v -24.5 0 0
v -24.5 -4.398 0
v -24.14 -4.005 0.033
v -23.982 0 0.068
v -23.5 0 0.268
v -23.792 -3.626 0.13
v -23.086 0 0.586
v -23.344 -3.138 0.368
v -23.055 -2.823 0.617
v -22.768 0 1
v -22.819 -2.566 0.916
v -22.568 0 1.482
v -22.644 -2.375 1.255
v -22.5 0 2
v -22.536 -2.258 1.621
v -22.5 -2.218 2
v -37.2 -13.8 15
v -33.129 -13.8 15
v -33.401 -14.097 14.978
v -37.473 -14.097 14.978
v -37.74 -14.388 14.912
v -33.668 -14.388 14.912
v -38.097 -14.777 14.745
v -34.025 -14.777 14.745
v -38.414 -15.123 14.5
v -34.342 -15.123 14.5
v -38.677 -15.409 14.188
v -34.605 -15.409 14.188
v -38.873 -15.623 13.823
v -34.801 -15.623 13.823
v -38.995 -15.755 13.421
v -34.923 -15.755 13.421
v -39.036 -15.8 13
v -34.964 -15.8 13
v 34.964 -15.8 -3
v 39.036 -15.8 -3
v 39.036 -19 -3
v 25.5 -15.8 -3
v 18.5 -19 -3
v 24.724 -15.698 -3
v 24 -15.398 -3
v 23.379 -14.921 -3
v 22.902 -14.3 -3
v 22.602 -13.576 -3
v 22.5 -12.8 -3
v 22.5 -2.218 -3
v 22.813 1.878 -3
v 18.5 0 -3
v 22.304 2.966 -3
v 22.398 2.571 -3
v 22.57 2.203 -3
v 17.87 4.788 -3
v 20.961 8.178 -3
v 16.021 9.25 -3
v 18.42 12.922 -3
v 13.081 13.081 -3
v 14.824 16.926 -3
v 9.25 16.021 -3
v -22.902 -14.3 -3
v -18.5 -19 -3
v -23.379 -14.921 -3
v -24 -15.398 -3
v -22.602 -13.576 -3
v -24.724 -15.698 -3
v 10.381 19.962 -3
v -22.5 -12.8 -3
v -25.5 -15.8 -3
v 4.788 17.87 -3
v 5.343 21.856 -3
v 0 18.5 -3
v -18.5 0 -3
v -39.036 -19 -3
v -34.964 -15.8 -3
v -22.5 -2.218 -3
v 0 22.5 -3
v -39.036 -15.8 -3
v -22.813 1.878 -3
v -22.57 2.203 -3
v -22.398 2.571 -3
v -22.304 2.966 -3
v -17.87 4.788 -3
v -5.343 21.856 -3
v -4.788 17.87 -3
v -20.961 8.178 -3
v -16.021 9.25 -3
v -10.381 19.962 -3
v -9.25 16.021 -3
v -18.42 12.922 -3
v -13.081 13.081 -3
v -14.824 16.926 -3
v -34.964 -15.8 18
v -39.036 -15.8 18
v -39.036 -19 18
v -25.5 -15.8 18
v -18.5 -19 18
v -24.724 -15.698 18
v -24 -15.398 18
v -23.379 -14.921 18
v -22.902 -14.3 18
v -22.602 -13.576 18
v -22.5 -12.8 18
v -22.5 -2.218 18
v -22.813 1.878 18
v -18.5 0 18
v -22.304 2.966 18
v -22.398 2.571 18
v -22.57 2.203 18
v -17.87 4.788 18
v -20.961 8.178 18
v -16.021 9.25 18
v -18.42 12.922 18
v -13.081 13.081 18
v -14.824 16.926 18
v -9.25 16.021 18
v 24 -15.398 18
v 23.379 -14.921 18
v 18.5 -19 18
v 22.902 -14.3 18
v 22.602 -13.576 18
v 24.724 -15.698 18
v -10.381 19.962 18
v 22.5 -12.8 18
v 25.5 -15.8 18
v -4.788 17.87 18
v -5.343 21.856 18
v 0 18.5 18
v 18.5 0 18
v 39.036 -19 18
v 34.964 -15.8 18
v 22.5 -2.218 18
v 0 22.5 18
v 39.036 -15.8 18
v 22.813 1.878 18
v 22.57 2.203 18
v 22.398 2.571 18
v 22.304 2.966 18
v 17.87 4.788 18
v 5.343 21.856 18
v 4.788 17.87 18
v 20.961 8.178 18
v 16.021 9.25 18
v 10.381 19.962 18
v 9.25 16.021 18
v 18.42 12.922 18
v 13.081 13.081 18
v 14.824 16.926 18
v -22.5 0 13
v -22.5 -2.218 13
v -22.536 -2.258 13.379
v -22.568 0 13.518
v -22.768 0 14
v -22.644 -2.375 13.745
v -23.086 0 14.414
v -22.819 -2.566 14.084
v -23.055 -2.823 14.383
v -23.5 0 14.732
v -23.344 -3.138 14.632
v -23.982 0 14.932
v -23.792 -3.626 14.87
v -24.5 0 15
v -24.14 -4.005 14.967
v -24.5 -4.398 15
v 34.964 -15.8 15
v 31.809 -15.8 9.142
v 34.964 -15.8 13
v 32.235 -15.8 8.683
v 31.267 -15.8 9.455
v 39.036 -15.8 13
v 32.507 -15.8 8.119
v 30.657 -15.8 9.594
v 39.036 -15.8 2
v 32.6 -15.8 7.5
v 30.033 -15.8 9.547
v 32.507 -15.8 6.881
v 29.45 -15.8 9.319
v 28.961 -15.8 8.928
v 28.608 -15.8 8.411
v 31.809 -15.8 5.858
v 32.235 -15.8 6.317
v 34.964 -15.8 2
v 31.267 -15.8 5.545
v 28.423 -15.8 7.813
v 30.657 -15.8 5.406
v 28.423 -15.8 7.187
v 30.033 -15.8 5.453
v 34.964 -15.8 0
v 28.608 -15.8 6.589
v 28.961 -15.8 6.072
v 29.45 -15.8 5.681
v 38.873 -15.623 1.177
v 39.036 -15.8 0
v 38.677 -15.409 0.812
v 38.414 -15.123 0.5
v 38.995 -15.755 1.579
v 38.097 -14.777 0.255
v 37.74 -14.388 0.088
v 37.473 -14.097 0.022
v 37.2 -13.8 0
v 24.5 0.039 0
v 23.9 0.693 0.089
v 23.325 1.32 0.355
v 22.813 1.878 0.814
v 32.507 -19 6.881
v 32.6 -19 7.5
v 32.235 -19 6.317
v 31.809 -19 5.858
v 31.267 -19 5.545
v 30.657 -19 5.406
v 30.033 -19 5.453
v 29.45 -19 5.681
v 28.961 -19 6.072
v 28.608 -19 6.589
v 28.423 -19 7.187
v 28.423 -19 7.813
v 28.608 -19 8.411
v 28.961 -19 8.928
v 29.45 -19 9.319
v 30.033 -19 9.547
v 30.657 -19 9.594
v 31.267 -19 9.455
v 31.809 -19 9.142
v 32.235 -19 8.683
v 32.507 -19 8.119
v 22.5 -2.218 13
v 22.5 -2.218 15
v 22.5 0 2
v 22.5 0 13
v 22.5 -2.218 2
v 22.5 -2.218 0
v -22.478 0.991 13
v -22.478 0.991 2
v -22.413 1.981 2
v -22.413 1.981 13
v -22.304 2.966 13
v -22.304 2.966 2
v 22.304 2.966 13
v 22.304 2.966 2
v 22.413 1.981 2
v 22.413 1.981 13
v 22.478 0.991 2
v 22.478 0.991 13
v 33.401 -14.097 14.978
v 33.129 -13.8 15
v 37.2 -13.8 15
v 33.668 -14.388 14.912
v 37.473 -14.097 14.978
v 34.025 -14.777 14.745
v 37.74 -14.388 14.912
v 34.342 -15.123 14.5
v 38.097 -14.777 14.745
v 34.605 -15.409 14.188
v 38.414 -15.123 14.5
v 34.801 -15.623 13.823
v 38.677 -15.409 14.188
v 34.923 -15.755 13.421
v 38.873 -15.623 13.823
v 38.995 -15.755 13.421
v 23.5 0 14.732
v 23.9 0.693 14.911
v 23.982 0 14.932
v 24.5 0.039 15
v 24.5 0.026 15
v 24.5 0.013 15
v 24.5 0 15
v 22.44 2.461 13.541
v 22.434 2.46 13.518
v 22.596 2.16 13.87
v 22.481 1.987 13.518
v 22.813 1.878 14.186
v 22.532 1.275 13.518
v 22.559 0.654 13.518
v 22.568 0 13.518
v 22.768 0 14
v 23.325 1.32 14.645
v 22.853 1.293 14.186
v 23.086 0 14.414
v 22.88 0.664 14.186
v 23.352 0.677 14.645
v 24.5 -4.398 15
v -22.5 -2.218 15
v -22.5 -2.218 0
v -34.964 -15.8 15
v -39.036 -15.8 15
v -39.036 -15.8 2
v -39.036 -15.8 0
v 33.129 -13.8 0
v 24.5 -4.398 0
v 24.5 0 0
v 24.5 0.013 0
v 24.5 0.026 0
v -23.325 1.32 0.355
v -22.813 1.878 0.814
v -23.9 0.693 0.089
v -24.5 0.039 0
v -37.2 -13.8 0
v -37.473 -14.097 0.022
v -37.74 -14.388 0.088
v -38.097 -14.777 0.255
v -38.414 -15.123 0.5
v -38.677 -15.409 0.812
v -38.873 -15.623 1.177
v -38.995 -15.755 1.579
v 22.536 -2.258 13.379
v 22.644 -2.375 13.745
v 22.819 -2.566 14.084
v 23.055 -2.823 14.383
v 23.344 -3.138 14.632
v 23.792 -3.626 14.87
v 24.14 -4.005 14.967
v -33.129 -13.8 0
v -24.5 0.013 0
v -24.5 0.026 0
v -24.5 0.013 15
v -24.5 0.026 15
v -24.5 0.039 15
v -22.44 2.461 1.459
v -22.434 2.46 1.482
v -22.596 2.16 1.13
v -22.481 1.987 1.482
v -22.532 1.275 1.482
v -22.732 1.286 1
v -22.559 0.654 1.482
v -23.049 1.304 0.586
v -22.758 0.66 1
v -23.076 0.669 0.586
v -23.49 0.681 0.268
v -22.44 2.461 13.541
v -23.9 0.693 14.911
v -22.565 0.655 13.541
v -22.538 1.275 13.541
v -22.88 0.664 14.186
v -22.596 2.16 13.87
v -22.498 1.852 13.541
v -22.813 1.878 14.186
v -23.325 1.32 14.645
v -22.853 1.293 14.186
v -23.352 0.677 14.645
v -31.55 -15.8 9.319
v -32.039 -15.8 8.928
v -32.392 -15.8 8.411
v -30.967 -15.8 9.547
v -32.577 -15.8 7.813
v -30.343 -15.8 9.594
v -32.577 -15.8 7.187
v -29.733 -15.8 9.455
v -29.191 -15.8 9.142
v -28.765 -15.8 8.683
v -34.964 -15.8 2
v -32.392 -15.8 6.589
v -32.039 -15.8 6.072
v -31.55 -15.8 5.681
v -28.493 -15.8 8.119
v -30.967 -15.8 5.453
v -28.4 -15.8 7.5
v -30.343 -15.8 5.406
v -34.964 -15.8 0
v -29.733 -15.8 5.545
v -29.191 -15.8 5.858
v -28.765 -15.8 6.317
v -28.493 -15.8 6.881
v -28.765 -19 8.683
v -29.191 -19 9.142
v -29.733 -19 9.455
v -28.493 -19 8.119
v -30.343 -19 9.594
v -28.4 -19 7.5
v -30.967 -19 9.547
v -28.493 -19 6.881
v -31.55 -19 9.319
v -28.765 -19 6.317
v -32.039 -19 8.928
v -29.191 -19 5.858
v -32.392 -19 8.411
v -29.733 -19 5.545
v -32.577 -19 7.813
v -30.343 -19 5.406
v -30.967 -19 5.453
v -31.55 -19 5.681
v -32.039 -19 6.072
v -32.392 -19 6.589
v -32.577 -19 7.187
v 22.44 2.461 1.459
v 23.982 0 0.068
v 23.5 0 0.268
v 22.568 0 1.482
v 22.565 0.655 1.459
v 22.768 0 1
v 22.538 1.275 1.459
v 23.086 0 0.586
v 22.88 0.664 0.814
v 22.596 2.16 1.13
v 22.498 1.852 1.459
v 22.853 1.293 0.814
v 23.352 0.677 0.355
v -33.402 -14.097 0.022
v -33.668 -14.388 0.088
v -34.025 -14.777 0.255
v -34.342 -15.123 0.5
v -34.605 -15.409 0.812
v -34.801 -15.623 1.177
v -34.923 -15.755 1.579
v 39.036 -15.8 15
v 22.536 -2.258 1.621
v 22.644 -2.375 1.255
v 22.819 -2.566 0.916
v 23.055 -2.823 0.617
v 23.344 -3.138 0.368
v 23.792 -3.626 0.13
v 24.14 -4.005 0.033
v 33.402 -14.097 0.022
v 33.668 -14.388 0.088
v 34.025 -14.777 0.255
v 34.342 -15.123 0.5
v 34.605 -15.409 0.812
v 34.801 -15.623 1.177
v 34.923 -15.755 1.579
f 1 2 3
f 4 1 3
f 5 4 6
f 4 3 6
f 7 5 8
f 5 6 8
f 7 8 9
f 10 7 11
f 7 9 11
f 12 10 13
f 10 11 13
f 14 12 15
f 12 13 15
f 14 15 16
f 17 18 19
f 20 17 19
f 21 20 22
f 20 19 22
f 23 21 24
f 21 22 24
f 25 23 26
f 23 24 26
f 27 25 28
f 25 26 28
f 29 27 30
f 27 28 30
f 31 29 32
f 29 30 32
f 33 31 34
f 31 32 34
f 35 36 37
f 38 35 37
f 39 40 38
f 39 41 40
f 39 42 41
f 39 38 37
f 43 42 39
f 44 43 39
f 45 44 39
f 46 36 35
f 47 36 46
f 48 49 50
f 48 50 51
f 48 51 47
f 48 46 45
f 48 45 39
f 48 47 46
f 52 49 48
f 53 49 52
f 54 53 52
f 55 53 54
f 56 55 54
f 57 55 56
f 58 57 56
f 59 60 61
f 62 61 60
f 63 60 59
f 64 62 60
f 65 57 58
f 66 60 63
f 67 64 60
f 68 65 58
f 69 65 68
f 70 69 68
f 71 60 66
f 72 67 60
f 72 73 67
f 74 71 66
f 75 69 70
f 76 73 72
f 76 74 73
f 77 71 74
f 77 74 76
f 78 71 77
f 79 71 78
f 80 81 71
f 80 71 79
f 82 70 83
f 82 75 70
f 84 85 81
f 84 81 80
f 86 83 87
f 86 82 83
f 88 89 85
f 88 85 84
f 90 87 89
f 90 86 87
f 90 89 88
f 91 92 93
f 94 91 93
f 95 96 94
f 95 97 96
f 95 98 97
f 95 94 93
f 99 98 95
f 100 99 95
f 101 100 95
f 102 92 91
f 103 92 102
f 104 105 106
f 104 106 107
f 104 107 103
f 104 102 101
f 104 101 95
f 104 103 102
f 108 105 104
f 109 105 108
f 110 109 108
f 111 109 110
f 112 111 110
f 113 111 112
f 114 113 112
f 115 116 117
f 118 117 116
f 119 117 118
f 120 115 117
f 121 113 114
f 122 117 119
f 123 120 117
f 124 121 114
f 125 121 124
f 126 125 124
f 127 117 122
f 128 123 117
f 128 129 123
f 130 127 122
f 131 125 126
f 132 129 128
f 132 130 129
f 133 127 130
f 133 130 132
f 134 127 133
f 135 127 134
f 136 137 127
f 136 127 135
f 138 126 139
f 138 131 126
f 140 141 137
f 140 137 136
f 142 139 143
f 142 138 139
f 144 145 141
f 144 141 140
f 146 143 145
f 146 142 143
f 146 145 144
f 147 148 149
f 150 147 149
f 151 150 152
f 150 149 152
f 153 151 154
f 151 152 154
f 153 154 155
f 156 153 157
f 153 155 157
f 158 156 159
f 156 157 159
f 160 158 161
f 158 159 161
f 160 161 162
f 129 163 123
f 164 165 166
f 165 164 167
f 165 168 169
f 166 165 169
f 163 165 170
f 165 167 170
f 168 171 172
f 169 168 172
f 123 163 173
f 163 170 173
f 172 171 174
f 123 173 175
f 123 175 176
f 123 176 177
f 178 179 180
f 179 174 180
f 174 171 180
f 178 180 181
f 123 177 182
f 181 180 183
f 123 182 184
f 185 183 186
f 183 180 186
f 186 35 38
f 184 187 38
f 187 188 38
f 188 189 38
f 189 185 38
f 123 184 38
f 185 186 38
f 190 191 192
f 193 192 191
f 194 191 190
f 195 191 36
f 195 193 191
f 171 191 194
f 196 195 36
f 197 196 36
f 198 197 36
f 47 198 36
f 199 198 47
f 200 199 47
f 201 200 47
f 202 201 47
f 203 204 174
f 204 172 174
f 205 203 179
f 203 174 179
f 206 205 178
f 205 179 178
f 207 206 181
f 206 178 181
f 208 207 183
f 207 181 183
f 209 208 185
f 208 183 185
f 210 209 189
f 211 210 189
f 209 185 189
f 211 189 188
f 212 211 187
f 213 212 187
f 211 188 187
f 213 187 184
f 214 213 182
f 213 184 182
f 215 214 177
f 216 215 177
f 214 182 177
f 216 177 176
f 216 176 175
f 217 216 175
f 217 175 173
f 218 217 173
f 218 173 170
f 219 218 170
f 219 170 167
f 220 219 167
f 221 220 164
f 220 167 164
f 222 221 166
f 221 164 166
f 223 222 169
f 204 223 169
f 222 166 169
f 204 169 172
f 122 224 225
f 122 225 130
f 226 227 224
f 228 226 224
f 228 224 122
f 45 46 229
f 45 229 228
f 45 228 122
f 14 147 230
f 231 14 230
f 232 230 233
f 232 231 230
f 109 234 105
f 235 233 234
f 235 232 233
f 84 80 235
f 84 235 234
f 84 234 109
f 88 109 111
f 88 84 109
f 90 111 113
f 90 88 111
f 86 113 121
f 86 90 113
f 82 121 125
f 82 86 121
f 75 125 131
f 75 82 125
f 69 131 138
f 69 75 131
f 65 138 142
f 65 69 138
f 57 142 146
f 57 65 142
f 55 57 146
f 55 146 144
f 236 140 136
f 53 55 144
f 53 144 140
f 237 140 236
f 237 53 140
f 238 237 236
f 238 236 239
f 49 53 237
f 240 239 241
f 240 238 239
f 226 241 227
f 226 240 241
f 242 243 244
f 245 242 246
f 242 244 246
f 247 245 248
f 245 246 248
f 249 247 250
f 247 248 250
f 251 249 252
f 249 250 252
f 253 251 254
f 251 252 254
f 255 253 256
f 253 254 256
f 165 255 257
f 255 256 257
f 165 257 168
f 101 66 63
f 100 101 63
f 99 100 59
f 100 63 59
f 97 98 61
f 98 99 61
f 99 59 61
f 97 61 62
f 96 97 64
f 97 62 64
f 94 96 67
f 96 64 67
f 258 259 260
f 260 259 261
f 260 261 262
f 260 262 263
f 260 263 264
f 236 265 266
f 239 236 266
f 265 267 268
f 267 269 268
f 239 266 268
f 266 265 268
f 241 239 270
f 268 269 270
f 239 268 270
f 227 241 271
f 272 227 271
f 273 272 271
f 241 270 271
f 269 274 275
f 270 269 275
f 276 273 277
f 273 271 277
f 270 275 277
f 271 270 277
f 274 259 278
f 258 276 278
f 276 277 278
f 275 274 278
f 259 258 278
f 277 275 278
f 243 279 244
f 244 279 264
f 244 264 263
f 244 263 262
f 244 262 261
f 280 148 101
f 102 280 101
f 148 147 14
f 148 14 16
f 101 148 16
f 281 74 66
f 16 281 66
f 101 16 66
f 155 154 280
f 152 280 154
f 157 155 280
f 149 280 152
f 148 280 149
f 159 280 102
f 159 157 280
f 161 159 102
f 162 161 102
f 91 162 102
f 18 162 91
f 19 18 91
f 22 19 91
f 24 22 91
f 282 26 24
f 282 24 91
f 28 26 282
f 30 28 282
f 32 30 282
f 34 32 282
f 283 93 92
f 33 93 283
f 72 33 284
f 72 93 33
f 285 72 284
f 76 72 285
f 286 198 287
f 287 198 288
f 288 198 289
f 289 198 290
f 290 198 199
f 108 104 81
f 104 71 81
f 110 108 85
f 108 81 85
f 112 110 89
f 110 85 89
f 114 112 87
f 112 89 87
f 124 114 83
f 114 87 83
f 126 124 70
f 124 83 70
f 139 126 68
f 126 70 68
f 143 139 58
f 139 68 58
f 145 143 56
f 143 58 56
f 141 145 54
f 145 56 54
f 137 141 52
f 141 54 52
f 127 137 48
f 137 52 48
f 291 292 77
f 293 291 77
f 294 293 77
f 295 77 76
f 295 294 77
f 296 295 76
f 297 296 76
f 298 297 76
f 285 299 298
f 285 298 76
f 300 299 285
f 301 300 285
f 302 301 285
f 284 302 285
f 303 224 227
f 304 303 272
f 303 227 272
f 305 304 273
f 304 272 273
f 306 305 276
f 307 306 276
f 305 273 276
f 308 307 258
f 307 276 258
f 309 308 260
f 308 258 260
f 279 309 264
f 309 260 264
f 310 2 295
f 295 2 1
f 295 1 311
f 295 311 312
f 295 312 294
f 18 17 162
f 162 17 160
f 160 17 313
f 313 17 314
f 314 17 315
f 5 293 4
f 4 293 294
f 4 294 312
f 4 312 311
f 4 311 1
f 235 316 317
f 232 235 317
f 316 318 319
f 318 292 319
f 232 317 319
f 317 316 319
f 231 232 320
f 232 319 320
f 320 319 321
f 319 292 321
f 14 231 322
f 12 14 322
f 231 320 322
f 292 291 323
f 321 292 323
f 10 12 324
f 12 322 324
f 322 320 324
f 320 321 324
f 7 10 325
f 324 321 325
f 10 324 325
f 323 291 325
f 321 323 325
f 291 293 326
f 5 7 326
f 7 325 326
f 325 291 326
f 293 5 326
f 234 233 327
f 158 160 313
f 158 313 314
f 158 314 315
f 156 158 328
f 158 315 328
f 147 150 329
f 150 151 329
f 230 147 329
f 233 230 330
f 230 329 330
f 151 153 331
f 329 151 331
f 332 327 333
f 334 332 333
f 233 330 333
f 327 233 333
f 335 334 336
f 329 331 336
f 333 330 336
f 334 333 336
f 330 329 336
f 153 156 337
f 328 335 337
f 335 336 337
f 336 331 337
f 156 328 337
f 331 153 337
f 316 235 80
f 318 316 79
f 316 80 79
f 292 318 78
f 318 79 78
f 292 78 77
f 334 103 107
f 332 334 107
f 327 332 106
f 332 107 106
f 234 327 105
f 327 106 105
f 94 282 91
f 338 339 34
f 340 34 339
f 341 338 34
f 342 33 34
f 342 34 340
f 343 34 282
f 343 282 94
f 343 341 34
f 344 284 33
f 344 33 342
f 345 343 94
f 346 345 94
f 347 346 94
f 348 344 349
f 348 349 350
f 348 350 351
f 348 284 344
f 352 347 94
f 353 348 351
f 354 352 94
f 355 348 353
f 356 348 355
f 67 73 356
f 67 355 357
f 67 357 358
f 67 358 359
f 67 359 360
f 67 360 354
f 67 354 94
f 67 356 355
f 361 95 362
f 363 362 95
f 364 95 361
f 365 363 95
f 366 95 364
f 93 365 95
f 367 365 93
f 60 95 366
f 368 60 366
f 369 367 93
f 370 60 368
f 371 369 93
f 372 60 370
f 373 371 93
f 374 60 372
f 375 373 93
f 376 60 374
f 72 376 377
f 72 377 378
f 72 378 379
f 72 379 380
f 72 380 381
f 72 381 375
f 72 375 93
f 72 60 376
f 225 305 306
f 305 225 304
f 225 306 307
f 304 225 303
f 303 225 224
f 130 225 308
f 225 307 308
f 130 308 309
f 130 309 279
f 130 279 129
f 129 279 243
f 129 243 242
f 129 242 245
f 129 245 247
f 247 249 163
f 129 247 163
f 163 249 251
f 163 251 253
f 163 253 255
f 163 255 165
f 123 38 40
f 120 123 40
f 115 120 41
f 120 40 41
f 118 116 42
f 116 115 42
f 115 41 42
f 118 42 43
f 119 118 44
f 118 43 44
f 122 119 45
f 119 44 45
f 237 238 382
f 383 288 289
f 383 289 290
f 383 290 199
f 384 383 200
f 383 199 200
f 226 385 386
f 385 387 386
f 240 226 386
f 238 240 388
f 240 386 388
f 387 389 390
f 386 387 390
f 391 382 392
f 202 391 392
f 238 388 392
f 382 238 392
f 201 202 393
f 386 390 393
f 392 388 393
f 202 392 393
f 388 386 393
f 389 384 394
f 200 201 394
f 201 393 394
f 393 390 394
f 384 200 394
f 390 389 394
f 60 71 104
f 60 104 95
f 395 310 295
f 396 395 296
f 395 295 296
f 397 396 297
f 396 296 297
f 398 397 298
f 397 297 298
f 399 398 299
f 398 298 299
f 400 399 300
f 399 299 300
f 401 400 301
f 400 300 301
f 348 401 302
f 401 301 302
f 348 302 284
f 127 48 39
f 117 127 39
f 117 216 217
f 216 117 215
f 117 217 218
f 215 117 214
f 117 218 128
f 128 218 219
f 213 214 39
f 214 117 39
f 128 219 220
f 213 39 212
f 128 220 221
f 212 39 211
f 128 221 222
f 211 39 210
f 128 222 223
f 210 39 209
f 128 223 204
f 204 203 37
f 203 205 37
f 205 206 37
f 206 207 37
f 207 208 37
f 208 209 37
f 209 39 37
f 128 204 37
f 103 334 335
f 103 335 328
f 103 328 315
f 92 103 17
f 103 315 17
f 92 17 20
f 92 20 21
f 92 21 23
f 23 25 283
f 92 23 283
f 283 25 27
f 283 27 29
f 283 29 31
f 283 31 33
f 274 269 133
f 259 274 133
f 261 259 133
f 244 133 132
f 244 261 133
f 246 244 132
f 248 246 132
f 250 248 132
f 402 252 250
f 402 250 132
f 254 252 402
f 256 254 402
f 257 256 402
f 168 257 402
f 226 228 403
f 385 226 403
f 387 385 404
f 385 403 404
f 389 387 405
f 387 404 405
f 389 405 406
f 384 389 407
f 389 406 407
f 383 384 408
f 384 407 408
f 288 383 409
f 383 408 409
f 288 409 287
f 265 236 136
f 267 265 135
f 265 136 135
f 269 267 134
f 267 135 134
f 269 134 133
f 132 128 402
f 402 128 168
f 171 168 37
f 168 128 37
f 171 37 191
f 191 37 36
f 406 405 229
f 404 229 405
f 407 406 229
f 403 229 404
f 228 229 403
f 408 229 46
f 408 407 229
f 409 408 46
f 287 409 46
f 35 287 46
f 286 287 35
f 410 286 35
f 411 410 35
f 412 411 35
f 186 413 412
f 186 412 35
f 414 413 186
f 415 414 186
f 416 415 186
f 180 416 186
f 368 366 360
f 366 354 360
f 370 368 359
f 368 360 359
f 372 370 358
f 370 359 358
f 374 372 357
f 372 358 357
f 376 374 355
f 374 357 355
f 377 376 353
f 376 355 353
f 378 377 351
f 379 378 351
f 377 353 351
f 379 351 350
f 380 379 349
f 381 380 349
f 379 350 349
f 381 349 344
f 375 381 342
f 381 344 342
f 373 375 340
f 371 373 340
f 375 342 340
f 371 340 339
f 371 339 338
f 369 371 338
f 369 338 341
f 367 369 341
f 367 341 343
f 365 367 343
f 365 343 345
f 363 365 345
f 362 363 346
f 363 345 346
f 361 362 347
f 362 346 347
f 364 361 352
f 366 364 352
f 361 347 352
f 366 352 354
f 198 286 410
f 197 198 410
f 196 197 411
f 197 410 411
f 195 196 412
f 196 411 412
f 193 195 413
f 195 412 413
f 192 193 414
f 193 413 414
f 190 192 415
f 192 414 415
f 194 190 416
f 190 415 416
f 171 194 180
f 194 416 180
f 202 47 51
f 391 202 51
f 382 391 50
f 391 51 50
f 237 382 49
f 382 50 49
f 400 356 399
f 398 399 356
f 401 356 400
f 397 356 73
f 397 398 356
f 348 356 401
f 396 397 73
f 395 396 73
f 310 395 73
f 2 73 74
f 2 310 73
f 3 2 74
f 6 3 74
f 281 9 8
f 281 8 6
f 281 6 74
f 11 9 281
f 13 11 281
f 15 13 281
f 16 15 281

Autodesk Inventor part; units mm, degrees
ref_plane "YZ Plane" through (0, 0, 0) normal (1, 0, 0) x (0, 1, 0)
ref_plane "XZ Plane" through (0, 0, 0) normal (0, 1, 0) x (-1, 0, 0)
ref_plane "XY Plane" through (0, 0, 0) normal (0, 0, 1) x (1, 0, 0)
sketch "Эскиз1" plane through (0, 0, 0) normal (0, 0, 1) x (1, 0, 0)
  arc A0 (18.5, 0) -> (-18.5, 0) centre (0, 0) ccw
  line L0 (-22.5, 0) -> (22.5, 0)
  arc A1 (22.5, 0) -> (-22.5, 0) centre (0, 0) ccw
  line L1 (-22.5, 0) -> (-22.5, -12.8)
  line L2 (-22.5, -19) -> (-35.5, -19)
  line L3 (-35.5, -19) -> (-35.5, -15.8)
  line L4 (-35.5, -15.8) -> (-25.5, -15.8)
  arc A2 (-25.5, -15.8) -> (-22.5, -12.8) centre (-25.5, -12.8) ccw
  line L5 (-18.5, 0) -> (-18.5, -19)
  line L6 (-18.5, -19) -> (-22.5, -19)
  line L7 (0, 0) -> (0, 6.7823)
  line L8 (22.5, 0) -> (22.5, -12.8)
  line L9 (22.5, -19) -> (35.5, -19)
  line L10 (35.5, -19) -> (35.5, -15.8)
  line L11 (35.5, -15.8) -> (25.5, -15.8)
  arc A3 (22.5, -12.8) -> (25.5, -15.8) centre (25.5, -12.8) ccw
  line L12 (18.5, 0) -> (18.5, -19)
  line L13 (18.5, -19) -> (22.5, -19)
  dimension "d0" = 37
  dimension "d1" = 45
  dimension "d2" = 13
  dimension "d3" = 3.2
  dimension "d4" = 3
extrude "Выдавливание1" add sketch "Эскиз1" along normal blind 15 contours A0 L0 A1 | L0 L8 A3 L11 L10 L9 L13 L12 | L5 L6 L2 L3 L4 A2 L1 L0
sketch "Эскиз2" plane through (-35.5, -15.8, 0) normal (0, 1, 0) x (1, 0, 0)
  line L0 (71, 0) -> (61, 0) projected
  line L1 (61, 0) -> (61, -15) projected
  line L2 (71, -15) -> (61, -15) projected
  line L3 (71, 0) -> (71, -15) projected
  line L4 (71, -7.5) -> (0, -7.5)
  line L5 (0, 0) -> (0, -15) projected
  line L6 (10, 0) -> (0, 0) projected
  line L7 (10, 0) -> (10, -15) projected
  line L8 (10, -15) -> (0, -15) projected
  line L9 (5, -15) -> (5, 0)
  circle A0 centre (5, -7.5) radius 2.1
  line L10 (35.5, 0) -> (35.5, -25.4)
  circle A1 centre (66, -7.5) radius 2.1
  dimension "d7" = 4.2
extrude "Выдавливание2" cut sketch "Эскиз2" against normal blind 20 contours A1 L4 | L4 A1 | A0 L9 L4 | L4 L9 A0 | L9 A0 L4 | L4 A0 L9
sketch "Эскиз3" plane through (0, 0, 15) normal (0, 0, 1) x (1, 0, 0)
  line L0 (35.5, -15.8) -> (39.0359, -15.8)
  line L1 (22.5, 0) -> (37, -15.8)
  line L2 (21.3948, -1.0142) -> (35.8948, -16.8142)
  line L3 (22.3766, 2.3529) -> (39.0359, -15.8)
  line L4 (-18.5, -19) -> (-18.5, 0) projected
  arc A0 (18.5, 0) -> (-18.5, 0) centre (0, 0) ccw projected
  line L5 (18.5, 0) -> (18.5, -19) projected
  line L6 (18.5, -19) -> (35.5, -19) projected
  line L7 (35.5, -19) -> (35.5, -15.8) projected
  line L8 (35.5, -15.8) -> (25.5, -15.8) projected
  arc A1 (22.5, -12.8) -> (25.5, -15.8) centre (25.5, -12.8) ccw projected
  line L9 (22.5, -12.8) -> (22.5, 0) projected
  arc A2 (22.5, 0) -> (-22.5, 0) centre (0, 0) ccw projected
  line L10 (-22.5, 0) -> (-22.5, -12.8) projected
  arc A3 (-25.5, -15.8) -> (-22.5, -12.8) centre (-25.5, -12.8) ccw projected
  line L11 (-25.5, -15.8) -> (-35.5, -15.8) projected
  line L12 (-35.5, -15.8) -> (-35.5, -19) projected
  line L13 (-35.5, -19) -> (-18.5, -19) projected
  line L14 (39.0359, -15.8) -> (35.5, -15.8)
  line L15 (35.5, -15.8) -> (35.5, -19)
  line L16 (35.5, -19) -> (39.0359, -19)
  line L17 (39.0359, -19) -> (39.0359, -15.8)
  line L18 (0, 0) -> (0, 30.1625)
  line L19 (-35.5, -15.8) -> (-39.0359, -15.8)
  line L20 (-22.5, 0) -> (-37, -15.8)
  line L21 (-21.3948, -1.0142) -> (-35.8948, -16.8142)
  line L22 (-22.3766, 2.3529) -> (-39.0359, -15.8)
  line L23 (-18.5, 0) -> (-18.5, -19)
  line L24 (-18.5, -19) -> (-35.5, -19)
  line L25 (-35.5, -19) -> (-35.5, -15.8)
  line L26 (-35.5, -15.8) -> (-25.5, -15.8)
  arc A4 (-25.5, -15.8) -> (-22.5, -12.8) centre (-25.5, -12.8) ccw
  line L27 (-22.5, -12.8) -> (-22.5, 0)
  line L28 (-39.0359, -15.8) -> (-35.5, -15.8)
  line L29 (-35.5, -15.8) -> (-35.5, -19)
  line L30 (-35.5, -19) -> (-39.0359, -19)
  line L31 (-39.0359, -19) -> (-39.0359, -15.8)
  point P0 (22.5, -2.2185)
  point P1 (34.9641, -15.8)
  point P2 (35.5, -16.384)
  point P3 (-34.9641, -15.8)
  point P4 (-22.5, -2.2185)
  dimension "d11" = 1.5
  dimension "d12" = 1.5
extrude "Выдавливание3" add sketch "Эскиз3" along normal blind 3 contours L8 L2 L9 L1 L0 | L0 L17 L16 L7 | L7 L2 L8 | L1 A2 L3 L0 | L7 L6 L5 A0 L18 A2 L9 A1 L8 L2 | L18 A0 L4 L13 L12 L21 L11 A3 L10 A2 | A2 L20 L19 L22 | L10 L21 L11 L19 L20 | L19 L12 L30 L31 | L21 L12 L11
sketch "Эскиз4" plane through (0, 0, 0) normal (0, 0, -1) x (-1, 0, 0)
  line L0 (18.5, -19) -> (18.5, 0) projected
  line L1 (35.5, -19) -> (18.5, -19) projected
  line L2 (35.5, -15.8) -> (35.5, -19) projected
  line L3 (25.5, -15.8) -> (35.5, -15.8) projected
  arc A0 (22.5, -12.8) -> (25.5, -15.8) centre (25.5, -12.8) ccw projected
  line L4 (22.5, 0) -> (22.5, -12.8) projected
  arc A1 (22.5, 0) -> (-22.5, 0) centre (0, 0) ccw projected
  line L5 (-22.5, -12.8) -> (-22.5, 0) projected
  arc A2 (-25.5, -15.8) -> (-22.5, -12.8) centre (-25.5, -12.8) ccw projected
  line L6 (-35.5, -15.8) -> (-25.5, -15.8) projected
  line L7 (-35.5, -19) -> (-35.5, -15.8) projected
  line L8 (-18.5, -19) -> (-35.5, -19) projected
  line L9 (-18.5, 0) -> (-18.5, -19) projected
  arc A3 (18.5, 0) -> (-18.5, 0) centre (0, 0) ccw projected
  line L10 (-35.5, -19) -> (-35.5, -15.8) projected
  line L11 (-35.5, -15.8) -> (-34.9641, -15.8) projected
  line L12 (-22.5, -2.2185) -> (-34.9641, -15.8) projected
  line L13 (-22.5, -2.2185) -> (-22.5, 0) projected
  arc A4 (-22.3766, 2.3529) -> (-22.5, 0) centre (0, 0) ccw projected
  line L14 (-39.0359, -15.8) -> (-22.3766, 2.3529) projected
  line L15 (-39.0359, -19) -> (-39.0359, -15.8) projected
  line L16 (-35.5, -19) -> (-39.0359, -19) projected
  line L17 (35.5, -15.8) -> (35.5, -19) projected
  line L18 (39.0359, -19) -> (35.5, -19) projected
  line L19 (39.0359, -15.8) -> (39.0359, -19) projected
  line L20 (22.3766, 2.3529) -> (39.0359, -15.8) projected
  arc A5 (22.5, 0) -> (22.3766, 2.3529) centre (0, 0) ccw projected
  line L21 (22.5, 0) -> (22.5, -2.2185) projected
  line L22 (34.9641, -15.8) -> (22.5, -2.2185) projected
  line L23 (34.9641, -15.8) -> (35.5, -15.8) projected
  point P0 (-22.3766, 2.3529)
extrude "Выдавливание4" add sketch "Эскиз4" along normal blind 3 contours L0 A3 L9 L8 L7 L6 A2 L5 A1 L4 A0 L3 L2 L1 | L2 L3 L22 L4 A1 L20 L19 L18 | L16 L15 L14 A1 L5 L12 L6 L7
sketch "Эскиз5" plane through (0, 0, 15) normal (0, 0, -1) x (-1, 0, 0)
  line L0 (-35.5, -19) -> (-35.5, -15.8) projected
  line L1 (-35.5, -15.8) -> (-34.9641, -15.8) projected
  line L2 (-22.5, -2.2185) -> (-34.9641, -15.8) projected
  line L3 (-22.5, -2.2185) -> (-22.5, 0) projected
  arc A0 (-22.3766, 2.3529) -> (-22.5, 0) centre (0, 0) ccw projected
  line L4 (-39.0359, -15.8) -> (-22.3766, 2.3529) projected
  line L5 (-39.0359, -19) -> (-39.0359, -15.8) projected
  line L6 (-35.5, -19) -> (-39.0359, -19) projected
  line L7 (35.5, -15.8) -> (35.5, -19) projected
  line L8 (39.0359, -19) -> (35.5, -19) projected
  line L9 (39.0359, -15.8) -> (39.0359, -19) projected
  line L10 (22.3766, 2.3529) -> (39.0359, -15.8) projected
  arc A1 (22.5, 0) -> (22.3766, 2.3529) centre (0, 0) ccw projected
  line L11 (22.5, 0) -> (22.5, -2.2185) projected
  line L12 (34.9641, -15.8) -> (22.5, -2.2185) projected
  line L13 (34.9641, -15.8) -> (35.5, -15.8) projected
  line L14 (39.0359, -15.8) -> (-39.0359, -15.8)
  line L15 (-18.5, -19) -> (-39.0359, -19) projected
extrude "Выдавливание5" add sketch "Эскиз5" along normal up to surface (15 mm away) contours L6 L5 L14 L0 | L14 L9 L8 L7
fillet "Сопряжение1" radius 2 16 edges at (-37, -15.8, 15) (-37, -15.8, 0) (-22.5, -1.1092, 0) (-22.4691, 1.1781, 0) (-22.5, -1.1092, 15) (-22.4691, 1.1781, 15) (22.3766, 2.3529, 16.5) (22.3766, 2.3529, -1.5) (22.5, -1.1092, 0) (22.4691, 1.1781, 0) (37, -15.8, 0) (37, -15.8, 15) (22.4691, 1.1781, 15) (22.5, -1.1092, 15) (-22.3766, 2.3529, 16.5) (-22.3766, 2.3529, -1.5)
properties part number "доп крепл мотора 25-26"
